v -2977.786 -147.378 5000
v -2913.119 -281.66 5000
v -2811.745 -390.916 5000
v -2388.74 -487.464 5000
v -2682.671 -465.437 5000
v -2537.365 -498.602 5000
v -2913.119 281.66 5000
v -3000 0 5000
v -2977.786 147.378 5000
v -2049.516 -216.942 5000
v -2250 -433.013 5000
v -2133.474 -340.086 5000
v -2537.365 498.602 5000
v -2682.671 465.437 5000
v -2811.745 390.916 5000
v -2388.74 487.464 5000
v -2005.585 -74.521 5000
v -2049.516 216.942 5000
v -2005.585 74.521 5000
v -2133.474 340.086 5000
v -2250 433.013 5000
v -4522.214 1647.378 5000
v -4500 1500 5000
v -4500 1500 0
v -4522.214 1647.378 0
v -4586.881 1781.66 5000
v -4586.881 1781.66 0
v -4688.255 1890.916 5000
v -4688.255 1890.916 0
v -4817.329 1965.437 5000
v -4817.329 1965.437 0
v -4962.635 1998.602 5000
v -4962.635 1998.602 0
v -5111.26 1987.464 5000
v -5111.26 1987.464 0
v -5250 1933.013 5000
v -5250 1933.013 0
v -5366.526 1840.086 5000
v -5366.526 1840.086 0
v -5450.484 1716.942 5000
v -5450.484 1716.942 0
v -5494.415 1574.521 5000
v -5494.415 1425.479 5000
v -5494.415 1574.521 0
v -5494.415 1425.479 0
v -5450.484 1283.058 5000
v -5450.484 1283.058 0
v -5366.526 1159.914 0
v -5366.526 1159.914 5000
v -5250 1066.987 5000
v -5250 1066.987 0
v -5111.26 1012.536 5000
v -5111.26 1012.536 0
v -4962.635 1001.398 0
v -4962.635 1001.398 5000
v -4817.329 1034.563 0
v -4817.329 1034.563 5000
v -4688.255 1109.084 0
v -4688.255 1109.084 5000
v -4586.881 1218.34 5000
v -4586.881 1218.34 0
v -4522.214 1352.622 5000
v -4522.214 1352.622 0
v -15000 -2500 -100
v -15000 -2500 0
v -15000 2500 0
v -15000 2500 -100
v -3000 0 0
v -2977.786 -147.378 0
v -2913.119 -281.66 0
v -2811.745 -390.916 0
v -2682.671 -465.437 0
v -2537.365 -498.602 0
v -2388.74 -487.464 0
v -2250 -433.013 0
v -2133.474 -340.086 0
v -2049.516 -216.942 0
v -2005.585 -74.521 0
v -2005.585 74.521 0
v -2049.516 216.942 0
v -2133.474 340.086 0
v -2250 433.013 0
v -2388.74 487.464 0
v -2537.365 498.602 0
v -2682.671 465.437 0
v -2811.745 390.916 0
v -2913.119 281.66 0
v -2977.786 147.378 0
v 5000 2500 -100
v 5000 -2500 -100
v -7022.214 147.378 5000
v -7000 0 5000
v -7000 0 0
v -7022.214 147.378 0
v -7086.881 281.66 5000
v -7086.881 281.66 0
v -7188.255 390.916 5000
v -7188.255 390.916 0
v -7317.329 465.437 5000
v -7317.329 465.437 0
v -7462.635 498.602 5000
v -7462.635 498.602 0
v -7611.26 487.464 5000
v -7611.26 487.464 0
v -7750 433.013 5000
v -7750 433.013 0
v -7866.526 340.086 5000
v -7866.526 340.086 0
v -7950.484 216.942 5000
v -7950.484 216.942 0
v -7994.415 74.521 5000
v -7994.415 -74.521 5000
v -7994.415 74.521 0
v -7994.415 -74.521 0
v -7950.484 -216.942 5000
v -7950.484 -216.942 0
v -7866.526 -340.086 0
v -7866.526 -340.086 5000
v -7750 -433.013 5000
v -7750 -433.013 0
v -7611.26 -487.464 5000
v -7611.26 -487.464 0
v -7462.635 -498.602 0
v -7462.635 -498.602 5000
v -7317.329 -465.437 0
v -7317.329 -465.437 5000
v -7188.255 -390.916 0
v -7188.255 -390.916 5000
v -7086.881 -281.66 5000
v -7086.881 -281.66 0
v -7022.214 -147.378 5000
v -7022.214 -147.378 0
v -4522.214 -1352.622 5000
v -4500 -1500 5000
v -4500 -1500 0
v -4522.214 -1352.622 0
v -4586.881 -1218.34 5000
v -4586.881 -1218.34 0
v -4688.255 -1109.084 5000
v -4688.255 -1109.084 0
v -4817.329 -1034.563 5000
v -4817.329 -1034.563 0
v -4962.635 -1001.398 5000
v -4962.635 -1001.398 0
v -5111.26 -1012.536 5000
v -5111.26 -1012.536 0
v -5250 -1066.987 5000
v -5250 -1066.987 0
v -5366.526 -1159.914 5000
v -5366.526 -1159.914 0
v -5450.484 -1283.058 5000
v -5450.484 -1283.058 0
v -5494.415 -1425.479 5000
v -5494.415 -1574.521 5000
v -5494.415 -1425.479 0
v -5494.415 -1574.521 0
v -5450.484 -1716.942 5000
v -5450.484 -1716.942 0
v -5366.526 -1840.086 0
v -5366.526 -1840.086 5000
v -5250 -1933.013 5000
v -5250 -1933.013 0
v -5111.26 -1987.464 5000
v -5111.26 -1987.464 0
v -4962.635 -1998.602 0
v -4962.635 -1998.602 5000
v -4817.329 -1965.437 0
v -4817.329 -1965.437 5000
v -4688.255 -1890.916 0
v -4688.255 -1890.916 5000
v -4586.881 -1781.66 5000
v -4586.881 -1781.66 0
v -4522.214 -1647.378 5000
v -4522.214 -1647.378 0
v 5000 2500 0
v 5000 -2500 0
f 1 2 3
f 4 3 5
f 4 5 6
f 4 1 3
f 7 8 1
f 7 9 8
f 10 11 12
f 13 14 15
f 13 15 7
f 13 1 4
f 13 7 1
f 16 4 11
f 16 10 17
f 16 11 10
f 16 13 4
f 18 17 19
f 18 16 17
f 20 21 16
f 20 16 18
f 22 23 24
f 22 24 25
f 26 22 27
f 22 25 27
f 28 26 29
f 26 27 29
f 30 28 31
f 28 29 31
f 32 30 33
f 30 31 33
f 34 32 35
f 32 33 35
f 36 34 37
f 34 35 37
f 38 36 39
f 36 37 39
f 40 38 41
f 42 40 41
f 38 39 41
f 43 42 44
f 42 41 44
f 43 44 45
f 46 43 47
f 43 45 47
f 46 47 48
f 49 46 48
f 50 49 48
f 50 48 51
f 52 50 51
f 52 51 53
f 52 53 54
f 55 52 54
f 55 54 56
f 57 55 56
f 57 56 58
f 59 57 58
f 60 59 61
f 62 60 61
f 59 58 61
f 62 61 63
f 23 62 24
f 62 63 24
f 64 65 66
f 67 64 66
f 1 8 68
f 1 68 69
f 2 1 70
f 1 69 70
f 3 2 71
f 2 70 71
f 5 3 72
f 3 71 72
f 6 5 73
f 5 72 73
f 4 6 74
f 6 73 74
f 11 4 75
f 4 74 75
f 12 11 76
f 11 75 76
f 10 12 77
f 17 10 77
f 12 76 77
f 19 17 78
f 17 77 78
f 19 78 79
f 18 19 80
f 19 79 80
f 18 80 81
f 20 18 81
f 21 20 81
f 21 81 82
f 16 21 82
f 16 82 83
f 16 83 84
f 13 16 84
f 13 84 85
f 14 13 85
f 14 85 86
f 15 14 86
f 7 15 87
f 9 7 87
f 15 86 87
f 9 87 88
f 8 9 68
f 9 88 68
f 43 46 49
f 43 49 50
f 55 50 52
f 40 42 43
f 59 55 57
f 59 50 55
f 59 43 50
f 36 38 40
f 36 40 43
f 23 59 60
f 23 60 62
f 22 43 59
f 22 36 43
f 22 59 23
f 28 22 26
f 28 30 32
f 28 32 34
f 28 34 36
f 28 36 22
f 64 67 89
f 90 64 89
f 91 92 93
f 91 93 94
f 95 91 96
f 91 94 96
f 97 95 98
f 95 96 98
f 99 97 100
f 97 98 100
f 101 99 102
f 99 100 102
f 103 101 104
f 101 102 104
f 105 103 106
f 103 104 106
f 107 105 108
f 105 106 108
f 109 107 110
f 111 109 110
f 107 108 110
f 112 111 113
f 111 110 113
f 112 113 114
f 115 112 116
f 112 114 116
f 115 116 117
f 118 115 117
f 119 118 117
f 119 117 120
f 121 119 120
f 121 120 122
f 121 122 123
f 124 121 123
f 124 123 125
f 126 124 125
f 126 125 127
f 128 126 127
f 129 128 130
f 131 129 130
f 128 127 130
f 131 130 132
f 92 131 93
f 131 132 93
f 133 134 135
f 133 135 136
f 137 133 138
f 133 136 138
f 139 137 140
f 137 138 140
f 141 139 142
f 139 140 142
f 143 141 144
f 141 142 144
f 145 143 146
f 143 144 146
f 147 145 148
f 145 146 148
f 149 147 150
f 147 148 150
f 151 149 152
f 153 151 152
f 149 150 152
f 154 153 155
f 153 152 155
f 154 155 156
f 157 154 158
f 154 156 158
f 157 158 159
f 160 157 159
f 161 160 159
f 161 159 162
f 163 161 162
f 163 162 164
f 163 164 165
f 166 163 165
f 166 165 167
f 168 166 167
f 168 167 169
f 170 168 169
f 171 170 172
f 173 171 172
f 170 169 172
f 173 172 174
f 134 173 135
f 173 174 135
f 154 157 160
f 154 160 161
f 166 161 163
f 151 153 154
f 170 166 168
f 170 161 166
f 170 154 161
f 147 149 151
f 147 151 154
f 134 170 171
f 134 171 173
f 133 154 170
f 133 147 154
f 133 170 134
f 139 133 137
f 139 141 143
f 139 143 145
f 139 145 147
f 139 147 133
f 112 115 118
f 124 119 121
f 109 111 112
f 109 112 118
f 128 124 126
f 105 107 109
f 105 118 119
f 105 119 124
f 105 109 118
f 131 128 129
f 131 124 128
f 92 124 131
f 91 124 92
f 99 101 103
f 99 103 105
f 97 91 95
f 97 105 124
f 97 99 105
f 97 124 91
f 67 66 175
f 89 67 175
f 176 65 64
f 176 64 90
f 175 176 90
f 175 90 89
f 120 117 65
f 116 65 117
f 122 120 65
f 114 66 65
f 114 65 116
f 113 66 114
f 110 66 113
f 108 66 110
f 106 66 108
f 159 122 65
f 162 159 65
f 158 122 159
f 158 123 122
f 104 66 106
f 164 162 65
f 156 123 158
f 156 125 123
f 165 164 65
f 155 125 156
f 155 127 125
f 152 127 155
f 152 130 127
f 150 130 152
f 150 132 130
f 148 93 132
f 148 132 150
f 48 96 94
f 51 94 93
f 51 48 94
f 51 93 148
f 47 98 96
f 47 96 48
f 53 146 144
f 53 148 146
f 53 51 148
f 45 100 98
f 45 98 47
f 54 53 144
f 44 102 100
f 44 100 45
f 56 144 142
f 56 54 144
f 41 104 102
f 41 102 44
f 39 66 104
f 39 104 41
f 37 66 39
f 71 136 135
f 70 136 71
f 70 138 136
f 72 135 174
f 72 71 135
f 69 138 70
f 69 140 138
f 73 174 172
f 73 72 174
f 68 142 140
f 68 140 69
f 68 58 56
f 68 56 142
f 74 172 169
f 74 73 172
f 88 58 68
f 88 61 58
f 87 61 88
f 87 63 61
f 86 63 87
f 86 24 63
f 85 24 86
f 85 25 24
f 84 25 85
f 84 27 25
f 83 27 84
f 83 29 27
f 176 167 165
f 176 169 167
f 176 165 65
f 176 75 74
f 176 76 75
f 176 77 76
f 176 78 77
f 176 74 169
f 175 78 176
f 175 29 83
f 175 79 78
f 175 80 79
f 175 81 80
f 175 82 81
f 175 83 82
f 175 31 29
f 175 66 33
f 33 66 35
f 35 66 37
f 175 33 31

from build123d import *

# Parameters (mm, degrees)
SKETCH1_W           = 20000
SKETCH1_H           = 5000
BOSS_EXTRUDE1_DEPTH = 100
SKETCH3_R           = 500
BOSS_EXTRUDE2_DEPTH = 5000


with BuildPart() as part:
    # Sketch1 → Boss-Extrude1 (new body)
    with BuildSketch(Plane.XY):
        with Locations((-5000, 0)):
            Rectangle(SKETCH1_W, SKETCH1_H)
    extrude(amount=-BOSS_EXTRUDE1_DEPTH)

    # Sketch3 → Boss-Extrude2 (add)
    with BuildSketch(Plane.XY):
        with Locations((-5000, 1500)):
            Circle(SKETCH3_R)
        with BuildLine():
            ThreePointArc((-2000, 0), (-2500, 500), (-3000, 0))
            Line((-3000, 0), (-2000, 0))
        make_face()
        with BuildLine():
            Line((-2000, 0), (-3000, 0))
            ThreePointArc((-3000, 0), (-2500, -500), (-2000, 0))
        make_face()
        with Locations((-5000, -1500)):
            Circle(SKETCH3_R)
        with Locations((-7500, 0)):
            Circle(SKETCH3_R)
    extrude(amount=BOSS_EXTRUDE2_DEPTH)


solid = part.part
